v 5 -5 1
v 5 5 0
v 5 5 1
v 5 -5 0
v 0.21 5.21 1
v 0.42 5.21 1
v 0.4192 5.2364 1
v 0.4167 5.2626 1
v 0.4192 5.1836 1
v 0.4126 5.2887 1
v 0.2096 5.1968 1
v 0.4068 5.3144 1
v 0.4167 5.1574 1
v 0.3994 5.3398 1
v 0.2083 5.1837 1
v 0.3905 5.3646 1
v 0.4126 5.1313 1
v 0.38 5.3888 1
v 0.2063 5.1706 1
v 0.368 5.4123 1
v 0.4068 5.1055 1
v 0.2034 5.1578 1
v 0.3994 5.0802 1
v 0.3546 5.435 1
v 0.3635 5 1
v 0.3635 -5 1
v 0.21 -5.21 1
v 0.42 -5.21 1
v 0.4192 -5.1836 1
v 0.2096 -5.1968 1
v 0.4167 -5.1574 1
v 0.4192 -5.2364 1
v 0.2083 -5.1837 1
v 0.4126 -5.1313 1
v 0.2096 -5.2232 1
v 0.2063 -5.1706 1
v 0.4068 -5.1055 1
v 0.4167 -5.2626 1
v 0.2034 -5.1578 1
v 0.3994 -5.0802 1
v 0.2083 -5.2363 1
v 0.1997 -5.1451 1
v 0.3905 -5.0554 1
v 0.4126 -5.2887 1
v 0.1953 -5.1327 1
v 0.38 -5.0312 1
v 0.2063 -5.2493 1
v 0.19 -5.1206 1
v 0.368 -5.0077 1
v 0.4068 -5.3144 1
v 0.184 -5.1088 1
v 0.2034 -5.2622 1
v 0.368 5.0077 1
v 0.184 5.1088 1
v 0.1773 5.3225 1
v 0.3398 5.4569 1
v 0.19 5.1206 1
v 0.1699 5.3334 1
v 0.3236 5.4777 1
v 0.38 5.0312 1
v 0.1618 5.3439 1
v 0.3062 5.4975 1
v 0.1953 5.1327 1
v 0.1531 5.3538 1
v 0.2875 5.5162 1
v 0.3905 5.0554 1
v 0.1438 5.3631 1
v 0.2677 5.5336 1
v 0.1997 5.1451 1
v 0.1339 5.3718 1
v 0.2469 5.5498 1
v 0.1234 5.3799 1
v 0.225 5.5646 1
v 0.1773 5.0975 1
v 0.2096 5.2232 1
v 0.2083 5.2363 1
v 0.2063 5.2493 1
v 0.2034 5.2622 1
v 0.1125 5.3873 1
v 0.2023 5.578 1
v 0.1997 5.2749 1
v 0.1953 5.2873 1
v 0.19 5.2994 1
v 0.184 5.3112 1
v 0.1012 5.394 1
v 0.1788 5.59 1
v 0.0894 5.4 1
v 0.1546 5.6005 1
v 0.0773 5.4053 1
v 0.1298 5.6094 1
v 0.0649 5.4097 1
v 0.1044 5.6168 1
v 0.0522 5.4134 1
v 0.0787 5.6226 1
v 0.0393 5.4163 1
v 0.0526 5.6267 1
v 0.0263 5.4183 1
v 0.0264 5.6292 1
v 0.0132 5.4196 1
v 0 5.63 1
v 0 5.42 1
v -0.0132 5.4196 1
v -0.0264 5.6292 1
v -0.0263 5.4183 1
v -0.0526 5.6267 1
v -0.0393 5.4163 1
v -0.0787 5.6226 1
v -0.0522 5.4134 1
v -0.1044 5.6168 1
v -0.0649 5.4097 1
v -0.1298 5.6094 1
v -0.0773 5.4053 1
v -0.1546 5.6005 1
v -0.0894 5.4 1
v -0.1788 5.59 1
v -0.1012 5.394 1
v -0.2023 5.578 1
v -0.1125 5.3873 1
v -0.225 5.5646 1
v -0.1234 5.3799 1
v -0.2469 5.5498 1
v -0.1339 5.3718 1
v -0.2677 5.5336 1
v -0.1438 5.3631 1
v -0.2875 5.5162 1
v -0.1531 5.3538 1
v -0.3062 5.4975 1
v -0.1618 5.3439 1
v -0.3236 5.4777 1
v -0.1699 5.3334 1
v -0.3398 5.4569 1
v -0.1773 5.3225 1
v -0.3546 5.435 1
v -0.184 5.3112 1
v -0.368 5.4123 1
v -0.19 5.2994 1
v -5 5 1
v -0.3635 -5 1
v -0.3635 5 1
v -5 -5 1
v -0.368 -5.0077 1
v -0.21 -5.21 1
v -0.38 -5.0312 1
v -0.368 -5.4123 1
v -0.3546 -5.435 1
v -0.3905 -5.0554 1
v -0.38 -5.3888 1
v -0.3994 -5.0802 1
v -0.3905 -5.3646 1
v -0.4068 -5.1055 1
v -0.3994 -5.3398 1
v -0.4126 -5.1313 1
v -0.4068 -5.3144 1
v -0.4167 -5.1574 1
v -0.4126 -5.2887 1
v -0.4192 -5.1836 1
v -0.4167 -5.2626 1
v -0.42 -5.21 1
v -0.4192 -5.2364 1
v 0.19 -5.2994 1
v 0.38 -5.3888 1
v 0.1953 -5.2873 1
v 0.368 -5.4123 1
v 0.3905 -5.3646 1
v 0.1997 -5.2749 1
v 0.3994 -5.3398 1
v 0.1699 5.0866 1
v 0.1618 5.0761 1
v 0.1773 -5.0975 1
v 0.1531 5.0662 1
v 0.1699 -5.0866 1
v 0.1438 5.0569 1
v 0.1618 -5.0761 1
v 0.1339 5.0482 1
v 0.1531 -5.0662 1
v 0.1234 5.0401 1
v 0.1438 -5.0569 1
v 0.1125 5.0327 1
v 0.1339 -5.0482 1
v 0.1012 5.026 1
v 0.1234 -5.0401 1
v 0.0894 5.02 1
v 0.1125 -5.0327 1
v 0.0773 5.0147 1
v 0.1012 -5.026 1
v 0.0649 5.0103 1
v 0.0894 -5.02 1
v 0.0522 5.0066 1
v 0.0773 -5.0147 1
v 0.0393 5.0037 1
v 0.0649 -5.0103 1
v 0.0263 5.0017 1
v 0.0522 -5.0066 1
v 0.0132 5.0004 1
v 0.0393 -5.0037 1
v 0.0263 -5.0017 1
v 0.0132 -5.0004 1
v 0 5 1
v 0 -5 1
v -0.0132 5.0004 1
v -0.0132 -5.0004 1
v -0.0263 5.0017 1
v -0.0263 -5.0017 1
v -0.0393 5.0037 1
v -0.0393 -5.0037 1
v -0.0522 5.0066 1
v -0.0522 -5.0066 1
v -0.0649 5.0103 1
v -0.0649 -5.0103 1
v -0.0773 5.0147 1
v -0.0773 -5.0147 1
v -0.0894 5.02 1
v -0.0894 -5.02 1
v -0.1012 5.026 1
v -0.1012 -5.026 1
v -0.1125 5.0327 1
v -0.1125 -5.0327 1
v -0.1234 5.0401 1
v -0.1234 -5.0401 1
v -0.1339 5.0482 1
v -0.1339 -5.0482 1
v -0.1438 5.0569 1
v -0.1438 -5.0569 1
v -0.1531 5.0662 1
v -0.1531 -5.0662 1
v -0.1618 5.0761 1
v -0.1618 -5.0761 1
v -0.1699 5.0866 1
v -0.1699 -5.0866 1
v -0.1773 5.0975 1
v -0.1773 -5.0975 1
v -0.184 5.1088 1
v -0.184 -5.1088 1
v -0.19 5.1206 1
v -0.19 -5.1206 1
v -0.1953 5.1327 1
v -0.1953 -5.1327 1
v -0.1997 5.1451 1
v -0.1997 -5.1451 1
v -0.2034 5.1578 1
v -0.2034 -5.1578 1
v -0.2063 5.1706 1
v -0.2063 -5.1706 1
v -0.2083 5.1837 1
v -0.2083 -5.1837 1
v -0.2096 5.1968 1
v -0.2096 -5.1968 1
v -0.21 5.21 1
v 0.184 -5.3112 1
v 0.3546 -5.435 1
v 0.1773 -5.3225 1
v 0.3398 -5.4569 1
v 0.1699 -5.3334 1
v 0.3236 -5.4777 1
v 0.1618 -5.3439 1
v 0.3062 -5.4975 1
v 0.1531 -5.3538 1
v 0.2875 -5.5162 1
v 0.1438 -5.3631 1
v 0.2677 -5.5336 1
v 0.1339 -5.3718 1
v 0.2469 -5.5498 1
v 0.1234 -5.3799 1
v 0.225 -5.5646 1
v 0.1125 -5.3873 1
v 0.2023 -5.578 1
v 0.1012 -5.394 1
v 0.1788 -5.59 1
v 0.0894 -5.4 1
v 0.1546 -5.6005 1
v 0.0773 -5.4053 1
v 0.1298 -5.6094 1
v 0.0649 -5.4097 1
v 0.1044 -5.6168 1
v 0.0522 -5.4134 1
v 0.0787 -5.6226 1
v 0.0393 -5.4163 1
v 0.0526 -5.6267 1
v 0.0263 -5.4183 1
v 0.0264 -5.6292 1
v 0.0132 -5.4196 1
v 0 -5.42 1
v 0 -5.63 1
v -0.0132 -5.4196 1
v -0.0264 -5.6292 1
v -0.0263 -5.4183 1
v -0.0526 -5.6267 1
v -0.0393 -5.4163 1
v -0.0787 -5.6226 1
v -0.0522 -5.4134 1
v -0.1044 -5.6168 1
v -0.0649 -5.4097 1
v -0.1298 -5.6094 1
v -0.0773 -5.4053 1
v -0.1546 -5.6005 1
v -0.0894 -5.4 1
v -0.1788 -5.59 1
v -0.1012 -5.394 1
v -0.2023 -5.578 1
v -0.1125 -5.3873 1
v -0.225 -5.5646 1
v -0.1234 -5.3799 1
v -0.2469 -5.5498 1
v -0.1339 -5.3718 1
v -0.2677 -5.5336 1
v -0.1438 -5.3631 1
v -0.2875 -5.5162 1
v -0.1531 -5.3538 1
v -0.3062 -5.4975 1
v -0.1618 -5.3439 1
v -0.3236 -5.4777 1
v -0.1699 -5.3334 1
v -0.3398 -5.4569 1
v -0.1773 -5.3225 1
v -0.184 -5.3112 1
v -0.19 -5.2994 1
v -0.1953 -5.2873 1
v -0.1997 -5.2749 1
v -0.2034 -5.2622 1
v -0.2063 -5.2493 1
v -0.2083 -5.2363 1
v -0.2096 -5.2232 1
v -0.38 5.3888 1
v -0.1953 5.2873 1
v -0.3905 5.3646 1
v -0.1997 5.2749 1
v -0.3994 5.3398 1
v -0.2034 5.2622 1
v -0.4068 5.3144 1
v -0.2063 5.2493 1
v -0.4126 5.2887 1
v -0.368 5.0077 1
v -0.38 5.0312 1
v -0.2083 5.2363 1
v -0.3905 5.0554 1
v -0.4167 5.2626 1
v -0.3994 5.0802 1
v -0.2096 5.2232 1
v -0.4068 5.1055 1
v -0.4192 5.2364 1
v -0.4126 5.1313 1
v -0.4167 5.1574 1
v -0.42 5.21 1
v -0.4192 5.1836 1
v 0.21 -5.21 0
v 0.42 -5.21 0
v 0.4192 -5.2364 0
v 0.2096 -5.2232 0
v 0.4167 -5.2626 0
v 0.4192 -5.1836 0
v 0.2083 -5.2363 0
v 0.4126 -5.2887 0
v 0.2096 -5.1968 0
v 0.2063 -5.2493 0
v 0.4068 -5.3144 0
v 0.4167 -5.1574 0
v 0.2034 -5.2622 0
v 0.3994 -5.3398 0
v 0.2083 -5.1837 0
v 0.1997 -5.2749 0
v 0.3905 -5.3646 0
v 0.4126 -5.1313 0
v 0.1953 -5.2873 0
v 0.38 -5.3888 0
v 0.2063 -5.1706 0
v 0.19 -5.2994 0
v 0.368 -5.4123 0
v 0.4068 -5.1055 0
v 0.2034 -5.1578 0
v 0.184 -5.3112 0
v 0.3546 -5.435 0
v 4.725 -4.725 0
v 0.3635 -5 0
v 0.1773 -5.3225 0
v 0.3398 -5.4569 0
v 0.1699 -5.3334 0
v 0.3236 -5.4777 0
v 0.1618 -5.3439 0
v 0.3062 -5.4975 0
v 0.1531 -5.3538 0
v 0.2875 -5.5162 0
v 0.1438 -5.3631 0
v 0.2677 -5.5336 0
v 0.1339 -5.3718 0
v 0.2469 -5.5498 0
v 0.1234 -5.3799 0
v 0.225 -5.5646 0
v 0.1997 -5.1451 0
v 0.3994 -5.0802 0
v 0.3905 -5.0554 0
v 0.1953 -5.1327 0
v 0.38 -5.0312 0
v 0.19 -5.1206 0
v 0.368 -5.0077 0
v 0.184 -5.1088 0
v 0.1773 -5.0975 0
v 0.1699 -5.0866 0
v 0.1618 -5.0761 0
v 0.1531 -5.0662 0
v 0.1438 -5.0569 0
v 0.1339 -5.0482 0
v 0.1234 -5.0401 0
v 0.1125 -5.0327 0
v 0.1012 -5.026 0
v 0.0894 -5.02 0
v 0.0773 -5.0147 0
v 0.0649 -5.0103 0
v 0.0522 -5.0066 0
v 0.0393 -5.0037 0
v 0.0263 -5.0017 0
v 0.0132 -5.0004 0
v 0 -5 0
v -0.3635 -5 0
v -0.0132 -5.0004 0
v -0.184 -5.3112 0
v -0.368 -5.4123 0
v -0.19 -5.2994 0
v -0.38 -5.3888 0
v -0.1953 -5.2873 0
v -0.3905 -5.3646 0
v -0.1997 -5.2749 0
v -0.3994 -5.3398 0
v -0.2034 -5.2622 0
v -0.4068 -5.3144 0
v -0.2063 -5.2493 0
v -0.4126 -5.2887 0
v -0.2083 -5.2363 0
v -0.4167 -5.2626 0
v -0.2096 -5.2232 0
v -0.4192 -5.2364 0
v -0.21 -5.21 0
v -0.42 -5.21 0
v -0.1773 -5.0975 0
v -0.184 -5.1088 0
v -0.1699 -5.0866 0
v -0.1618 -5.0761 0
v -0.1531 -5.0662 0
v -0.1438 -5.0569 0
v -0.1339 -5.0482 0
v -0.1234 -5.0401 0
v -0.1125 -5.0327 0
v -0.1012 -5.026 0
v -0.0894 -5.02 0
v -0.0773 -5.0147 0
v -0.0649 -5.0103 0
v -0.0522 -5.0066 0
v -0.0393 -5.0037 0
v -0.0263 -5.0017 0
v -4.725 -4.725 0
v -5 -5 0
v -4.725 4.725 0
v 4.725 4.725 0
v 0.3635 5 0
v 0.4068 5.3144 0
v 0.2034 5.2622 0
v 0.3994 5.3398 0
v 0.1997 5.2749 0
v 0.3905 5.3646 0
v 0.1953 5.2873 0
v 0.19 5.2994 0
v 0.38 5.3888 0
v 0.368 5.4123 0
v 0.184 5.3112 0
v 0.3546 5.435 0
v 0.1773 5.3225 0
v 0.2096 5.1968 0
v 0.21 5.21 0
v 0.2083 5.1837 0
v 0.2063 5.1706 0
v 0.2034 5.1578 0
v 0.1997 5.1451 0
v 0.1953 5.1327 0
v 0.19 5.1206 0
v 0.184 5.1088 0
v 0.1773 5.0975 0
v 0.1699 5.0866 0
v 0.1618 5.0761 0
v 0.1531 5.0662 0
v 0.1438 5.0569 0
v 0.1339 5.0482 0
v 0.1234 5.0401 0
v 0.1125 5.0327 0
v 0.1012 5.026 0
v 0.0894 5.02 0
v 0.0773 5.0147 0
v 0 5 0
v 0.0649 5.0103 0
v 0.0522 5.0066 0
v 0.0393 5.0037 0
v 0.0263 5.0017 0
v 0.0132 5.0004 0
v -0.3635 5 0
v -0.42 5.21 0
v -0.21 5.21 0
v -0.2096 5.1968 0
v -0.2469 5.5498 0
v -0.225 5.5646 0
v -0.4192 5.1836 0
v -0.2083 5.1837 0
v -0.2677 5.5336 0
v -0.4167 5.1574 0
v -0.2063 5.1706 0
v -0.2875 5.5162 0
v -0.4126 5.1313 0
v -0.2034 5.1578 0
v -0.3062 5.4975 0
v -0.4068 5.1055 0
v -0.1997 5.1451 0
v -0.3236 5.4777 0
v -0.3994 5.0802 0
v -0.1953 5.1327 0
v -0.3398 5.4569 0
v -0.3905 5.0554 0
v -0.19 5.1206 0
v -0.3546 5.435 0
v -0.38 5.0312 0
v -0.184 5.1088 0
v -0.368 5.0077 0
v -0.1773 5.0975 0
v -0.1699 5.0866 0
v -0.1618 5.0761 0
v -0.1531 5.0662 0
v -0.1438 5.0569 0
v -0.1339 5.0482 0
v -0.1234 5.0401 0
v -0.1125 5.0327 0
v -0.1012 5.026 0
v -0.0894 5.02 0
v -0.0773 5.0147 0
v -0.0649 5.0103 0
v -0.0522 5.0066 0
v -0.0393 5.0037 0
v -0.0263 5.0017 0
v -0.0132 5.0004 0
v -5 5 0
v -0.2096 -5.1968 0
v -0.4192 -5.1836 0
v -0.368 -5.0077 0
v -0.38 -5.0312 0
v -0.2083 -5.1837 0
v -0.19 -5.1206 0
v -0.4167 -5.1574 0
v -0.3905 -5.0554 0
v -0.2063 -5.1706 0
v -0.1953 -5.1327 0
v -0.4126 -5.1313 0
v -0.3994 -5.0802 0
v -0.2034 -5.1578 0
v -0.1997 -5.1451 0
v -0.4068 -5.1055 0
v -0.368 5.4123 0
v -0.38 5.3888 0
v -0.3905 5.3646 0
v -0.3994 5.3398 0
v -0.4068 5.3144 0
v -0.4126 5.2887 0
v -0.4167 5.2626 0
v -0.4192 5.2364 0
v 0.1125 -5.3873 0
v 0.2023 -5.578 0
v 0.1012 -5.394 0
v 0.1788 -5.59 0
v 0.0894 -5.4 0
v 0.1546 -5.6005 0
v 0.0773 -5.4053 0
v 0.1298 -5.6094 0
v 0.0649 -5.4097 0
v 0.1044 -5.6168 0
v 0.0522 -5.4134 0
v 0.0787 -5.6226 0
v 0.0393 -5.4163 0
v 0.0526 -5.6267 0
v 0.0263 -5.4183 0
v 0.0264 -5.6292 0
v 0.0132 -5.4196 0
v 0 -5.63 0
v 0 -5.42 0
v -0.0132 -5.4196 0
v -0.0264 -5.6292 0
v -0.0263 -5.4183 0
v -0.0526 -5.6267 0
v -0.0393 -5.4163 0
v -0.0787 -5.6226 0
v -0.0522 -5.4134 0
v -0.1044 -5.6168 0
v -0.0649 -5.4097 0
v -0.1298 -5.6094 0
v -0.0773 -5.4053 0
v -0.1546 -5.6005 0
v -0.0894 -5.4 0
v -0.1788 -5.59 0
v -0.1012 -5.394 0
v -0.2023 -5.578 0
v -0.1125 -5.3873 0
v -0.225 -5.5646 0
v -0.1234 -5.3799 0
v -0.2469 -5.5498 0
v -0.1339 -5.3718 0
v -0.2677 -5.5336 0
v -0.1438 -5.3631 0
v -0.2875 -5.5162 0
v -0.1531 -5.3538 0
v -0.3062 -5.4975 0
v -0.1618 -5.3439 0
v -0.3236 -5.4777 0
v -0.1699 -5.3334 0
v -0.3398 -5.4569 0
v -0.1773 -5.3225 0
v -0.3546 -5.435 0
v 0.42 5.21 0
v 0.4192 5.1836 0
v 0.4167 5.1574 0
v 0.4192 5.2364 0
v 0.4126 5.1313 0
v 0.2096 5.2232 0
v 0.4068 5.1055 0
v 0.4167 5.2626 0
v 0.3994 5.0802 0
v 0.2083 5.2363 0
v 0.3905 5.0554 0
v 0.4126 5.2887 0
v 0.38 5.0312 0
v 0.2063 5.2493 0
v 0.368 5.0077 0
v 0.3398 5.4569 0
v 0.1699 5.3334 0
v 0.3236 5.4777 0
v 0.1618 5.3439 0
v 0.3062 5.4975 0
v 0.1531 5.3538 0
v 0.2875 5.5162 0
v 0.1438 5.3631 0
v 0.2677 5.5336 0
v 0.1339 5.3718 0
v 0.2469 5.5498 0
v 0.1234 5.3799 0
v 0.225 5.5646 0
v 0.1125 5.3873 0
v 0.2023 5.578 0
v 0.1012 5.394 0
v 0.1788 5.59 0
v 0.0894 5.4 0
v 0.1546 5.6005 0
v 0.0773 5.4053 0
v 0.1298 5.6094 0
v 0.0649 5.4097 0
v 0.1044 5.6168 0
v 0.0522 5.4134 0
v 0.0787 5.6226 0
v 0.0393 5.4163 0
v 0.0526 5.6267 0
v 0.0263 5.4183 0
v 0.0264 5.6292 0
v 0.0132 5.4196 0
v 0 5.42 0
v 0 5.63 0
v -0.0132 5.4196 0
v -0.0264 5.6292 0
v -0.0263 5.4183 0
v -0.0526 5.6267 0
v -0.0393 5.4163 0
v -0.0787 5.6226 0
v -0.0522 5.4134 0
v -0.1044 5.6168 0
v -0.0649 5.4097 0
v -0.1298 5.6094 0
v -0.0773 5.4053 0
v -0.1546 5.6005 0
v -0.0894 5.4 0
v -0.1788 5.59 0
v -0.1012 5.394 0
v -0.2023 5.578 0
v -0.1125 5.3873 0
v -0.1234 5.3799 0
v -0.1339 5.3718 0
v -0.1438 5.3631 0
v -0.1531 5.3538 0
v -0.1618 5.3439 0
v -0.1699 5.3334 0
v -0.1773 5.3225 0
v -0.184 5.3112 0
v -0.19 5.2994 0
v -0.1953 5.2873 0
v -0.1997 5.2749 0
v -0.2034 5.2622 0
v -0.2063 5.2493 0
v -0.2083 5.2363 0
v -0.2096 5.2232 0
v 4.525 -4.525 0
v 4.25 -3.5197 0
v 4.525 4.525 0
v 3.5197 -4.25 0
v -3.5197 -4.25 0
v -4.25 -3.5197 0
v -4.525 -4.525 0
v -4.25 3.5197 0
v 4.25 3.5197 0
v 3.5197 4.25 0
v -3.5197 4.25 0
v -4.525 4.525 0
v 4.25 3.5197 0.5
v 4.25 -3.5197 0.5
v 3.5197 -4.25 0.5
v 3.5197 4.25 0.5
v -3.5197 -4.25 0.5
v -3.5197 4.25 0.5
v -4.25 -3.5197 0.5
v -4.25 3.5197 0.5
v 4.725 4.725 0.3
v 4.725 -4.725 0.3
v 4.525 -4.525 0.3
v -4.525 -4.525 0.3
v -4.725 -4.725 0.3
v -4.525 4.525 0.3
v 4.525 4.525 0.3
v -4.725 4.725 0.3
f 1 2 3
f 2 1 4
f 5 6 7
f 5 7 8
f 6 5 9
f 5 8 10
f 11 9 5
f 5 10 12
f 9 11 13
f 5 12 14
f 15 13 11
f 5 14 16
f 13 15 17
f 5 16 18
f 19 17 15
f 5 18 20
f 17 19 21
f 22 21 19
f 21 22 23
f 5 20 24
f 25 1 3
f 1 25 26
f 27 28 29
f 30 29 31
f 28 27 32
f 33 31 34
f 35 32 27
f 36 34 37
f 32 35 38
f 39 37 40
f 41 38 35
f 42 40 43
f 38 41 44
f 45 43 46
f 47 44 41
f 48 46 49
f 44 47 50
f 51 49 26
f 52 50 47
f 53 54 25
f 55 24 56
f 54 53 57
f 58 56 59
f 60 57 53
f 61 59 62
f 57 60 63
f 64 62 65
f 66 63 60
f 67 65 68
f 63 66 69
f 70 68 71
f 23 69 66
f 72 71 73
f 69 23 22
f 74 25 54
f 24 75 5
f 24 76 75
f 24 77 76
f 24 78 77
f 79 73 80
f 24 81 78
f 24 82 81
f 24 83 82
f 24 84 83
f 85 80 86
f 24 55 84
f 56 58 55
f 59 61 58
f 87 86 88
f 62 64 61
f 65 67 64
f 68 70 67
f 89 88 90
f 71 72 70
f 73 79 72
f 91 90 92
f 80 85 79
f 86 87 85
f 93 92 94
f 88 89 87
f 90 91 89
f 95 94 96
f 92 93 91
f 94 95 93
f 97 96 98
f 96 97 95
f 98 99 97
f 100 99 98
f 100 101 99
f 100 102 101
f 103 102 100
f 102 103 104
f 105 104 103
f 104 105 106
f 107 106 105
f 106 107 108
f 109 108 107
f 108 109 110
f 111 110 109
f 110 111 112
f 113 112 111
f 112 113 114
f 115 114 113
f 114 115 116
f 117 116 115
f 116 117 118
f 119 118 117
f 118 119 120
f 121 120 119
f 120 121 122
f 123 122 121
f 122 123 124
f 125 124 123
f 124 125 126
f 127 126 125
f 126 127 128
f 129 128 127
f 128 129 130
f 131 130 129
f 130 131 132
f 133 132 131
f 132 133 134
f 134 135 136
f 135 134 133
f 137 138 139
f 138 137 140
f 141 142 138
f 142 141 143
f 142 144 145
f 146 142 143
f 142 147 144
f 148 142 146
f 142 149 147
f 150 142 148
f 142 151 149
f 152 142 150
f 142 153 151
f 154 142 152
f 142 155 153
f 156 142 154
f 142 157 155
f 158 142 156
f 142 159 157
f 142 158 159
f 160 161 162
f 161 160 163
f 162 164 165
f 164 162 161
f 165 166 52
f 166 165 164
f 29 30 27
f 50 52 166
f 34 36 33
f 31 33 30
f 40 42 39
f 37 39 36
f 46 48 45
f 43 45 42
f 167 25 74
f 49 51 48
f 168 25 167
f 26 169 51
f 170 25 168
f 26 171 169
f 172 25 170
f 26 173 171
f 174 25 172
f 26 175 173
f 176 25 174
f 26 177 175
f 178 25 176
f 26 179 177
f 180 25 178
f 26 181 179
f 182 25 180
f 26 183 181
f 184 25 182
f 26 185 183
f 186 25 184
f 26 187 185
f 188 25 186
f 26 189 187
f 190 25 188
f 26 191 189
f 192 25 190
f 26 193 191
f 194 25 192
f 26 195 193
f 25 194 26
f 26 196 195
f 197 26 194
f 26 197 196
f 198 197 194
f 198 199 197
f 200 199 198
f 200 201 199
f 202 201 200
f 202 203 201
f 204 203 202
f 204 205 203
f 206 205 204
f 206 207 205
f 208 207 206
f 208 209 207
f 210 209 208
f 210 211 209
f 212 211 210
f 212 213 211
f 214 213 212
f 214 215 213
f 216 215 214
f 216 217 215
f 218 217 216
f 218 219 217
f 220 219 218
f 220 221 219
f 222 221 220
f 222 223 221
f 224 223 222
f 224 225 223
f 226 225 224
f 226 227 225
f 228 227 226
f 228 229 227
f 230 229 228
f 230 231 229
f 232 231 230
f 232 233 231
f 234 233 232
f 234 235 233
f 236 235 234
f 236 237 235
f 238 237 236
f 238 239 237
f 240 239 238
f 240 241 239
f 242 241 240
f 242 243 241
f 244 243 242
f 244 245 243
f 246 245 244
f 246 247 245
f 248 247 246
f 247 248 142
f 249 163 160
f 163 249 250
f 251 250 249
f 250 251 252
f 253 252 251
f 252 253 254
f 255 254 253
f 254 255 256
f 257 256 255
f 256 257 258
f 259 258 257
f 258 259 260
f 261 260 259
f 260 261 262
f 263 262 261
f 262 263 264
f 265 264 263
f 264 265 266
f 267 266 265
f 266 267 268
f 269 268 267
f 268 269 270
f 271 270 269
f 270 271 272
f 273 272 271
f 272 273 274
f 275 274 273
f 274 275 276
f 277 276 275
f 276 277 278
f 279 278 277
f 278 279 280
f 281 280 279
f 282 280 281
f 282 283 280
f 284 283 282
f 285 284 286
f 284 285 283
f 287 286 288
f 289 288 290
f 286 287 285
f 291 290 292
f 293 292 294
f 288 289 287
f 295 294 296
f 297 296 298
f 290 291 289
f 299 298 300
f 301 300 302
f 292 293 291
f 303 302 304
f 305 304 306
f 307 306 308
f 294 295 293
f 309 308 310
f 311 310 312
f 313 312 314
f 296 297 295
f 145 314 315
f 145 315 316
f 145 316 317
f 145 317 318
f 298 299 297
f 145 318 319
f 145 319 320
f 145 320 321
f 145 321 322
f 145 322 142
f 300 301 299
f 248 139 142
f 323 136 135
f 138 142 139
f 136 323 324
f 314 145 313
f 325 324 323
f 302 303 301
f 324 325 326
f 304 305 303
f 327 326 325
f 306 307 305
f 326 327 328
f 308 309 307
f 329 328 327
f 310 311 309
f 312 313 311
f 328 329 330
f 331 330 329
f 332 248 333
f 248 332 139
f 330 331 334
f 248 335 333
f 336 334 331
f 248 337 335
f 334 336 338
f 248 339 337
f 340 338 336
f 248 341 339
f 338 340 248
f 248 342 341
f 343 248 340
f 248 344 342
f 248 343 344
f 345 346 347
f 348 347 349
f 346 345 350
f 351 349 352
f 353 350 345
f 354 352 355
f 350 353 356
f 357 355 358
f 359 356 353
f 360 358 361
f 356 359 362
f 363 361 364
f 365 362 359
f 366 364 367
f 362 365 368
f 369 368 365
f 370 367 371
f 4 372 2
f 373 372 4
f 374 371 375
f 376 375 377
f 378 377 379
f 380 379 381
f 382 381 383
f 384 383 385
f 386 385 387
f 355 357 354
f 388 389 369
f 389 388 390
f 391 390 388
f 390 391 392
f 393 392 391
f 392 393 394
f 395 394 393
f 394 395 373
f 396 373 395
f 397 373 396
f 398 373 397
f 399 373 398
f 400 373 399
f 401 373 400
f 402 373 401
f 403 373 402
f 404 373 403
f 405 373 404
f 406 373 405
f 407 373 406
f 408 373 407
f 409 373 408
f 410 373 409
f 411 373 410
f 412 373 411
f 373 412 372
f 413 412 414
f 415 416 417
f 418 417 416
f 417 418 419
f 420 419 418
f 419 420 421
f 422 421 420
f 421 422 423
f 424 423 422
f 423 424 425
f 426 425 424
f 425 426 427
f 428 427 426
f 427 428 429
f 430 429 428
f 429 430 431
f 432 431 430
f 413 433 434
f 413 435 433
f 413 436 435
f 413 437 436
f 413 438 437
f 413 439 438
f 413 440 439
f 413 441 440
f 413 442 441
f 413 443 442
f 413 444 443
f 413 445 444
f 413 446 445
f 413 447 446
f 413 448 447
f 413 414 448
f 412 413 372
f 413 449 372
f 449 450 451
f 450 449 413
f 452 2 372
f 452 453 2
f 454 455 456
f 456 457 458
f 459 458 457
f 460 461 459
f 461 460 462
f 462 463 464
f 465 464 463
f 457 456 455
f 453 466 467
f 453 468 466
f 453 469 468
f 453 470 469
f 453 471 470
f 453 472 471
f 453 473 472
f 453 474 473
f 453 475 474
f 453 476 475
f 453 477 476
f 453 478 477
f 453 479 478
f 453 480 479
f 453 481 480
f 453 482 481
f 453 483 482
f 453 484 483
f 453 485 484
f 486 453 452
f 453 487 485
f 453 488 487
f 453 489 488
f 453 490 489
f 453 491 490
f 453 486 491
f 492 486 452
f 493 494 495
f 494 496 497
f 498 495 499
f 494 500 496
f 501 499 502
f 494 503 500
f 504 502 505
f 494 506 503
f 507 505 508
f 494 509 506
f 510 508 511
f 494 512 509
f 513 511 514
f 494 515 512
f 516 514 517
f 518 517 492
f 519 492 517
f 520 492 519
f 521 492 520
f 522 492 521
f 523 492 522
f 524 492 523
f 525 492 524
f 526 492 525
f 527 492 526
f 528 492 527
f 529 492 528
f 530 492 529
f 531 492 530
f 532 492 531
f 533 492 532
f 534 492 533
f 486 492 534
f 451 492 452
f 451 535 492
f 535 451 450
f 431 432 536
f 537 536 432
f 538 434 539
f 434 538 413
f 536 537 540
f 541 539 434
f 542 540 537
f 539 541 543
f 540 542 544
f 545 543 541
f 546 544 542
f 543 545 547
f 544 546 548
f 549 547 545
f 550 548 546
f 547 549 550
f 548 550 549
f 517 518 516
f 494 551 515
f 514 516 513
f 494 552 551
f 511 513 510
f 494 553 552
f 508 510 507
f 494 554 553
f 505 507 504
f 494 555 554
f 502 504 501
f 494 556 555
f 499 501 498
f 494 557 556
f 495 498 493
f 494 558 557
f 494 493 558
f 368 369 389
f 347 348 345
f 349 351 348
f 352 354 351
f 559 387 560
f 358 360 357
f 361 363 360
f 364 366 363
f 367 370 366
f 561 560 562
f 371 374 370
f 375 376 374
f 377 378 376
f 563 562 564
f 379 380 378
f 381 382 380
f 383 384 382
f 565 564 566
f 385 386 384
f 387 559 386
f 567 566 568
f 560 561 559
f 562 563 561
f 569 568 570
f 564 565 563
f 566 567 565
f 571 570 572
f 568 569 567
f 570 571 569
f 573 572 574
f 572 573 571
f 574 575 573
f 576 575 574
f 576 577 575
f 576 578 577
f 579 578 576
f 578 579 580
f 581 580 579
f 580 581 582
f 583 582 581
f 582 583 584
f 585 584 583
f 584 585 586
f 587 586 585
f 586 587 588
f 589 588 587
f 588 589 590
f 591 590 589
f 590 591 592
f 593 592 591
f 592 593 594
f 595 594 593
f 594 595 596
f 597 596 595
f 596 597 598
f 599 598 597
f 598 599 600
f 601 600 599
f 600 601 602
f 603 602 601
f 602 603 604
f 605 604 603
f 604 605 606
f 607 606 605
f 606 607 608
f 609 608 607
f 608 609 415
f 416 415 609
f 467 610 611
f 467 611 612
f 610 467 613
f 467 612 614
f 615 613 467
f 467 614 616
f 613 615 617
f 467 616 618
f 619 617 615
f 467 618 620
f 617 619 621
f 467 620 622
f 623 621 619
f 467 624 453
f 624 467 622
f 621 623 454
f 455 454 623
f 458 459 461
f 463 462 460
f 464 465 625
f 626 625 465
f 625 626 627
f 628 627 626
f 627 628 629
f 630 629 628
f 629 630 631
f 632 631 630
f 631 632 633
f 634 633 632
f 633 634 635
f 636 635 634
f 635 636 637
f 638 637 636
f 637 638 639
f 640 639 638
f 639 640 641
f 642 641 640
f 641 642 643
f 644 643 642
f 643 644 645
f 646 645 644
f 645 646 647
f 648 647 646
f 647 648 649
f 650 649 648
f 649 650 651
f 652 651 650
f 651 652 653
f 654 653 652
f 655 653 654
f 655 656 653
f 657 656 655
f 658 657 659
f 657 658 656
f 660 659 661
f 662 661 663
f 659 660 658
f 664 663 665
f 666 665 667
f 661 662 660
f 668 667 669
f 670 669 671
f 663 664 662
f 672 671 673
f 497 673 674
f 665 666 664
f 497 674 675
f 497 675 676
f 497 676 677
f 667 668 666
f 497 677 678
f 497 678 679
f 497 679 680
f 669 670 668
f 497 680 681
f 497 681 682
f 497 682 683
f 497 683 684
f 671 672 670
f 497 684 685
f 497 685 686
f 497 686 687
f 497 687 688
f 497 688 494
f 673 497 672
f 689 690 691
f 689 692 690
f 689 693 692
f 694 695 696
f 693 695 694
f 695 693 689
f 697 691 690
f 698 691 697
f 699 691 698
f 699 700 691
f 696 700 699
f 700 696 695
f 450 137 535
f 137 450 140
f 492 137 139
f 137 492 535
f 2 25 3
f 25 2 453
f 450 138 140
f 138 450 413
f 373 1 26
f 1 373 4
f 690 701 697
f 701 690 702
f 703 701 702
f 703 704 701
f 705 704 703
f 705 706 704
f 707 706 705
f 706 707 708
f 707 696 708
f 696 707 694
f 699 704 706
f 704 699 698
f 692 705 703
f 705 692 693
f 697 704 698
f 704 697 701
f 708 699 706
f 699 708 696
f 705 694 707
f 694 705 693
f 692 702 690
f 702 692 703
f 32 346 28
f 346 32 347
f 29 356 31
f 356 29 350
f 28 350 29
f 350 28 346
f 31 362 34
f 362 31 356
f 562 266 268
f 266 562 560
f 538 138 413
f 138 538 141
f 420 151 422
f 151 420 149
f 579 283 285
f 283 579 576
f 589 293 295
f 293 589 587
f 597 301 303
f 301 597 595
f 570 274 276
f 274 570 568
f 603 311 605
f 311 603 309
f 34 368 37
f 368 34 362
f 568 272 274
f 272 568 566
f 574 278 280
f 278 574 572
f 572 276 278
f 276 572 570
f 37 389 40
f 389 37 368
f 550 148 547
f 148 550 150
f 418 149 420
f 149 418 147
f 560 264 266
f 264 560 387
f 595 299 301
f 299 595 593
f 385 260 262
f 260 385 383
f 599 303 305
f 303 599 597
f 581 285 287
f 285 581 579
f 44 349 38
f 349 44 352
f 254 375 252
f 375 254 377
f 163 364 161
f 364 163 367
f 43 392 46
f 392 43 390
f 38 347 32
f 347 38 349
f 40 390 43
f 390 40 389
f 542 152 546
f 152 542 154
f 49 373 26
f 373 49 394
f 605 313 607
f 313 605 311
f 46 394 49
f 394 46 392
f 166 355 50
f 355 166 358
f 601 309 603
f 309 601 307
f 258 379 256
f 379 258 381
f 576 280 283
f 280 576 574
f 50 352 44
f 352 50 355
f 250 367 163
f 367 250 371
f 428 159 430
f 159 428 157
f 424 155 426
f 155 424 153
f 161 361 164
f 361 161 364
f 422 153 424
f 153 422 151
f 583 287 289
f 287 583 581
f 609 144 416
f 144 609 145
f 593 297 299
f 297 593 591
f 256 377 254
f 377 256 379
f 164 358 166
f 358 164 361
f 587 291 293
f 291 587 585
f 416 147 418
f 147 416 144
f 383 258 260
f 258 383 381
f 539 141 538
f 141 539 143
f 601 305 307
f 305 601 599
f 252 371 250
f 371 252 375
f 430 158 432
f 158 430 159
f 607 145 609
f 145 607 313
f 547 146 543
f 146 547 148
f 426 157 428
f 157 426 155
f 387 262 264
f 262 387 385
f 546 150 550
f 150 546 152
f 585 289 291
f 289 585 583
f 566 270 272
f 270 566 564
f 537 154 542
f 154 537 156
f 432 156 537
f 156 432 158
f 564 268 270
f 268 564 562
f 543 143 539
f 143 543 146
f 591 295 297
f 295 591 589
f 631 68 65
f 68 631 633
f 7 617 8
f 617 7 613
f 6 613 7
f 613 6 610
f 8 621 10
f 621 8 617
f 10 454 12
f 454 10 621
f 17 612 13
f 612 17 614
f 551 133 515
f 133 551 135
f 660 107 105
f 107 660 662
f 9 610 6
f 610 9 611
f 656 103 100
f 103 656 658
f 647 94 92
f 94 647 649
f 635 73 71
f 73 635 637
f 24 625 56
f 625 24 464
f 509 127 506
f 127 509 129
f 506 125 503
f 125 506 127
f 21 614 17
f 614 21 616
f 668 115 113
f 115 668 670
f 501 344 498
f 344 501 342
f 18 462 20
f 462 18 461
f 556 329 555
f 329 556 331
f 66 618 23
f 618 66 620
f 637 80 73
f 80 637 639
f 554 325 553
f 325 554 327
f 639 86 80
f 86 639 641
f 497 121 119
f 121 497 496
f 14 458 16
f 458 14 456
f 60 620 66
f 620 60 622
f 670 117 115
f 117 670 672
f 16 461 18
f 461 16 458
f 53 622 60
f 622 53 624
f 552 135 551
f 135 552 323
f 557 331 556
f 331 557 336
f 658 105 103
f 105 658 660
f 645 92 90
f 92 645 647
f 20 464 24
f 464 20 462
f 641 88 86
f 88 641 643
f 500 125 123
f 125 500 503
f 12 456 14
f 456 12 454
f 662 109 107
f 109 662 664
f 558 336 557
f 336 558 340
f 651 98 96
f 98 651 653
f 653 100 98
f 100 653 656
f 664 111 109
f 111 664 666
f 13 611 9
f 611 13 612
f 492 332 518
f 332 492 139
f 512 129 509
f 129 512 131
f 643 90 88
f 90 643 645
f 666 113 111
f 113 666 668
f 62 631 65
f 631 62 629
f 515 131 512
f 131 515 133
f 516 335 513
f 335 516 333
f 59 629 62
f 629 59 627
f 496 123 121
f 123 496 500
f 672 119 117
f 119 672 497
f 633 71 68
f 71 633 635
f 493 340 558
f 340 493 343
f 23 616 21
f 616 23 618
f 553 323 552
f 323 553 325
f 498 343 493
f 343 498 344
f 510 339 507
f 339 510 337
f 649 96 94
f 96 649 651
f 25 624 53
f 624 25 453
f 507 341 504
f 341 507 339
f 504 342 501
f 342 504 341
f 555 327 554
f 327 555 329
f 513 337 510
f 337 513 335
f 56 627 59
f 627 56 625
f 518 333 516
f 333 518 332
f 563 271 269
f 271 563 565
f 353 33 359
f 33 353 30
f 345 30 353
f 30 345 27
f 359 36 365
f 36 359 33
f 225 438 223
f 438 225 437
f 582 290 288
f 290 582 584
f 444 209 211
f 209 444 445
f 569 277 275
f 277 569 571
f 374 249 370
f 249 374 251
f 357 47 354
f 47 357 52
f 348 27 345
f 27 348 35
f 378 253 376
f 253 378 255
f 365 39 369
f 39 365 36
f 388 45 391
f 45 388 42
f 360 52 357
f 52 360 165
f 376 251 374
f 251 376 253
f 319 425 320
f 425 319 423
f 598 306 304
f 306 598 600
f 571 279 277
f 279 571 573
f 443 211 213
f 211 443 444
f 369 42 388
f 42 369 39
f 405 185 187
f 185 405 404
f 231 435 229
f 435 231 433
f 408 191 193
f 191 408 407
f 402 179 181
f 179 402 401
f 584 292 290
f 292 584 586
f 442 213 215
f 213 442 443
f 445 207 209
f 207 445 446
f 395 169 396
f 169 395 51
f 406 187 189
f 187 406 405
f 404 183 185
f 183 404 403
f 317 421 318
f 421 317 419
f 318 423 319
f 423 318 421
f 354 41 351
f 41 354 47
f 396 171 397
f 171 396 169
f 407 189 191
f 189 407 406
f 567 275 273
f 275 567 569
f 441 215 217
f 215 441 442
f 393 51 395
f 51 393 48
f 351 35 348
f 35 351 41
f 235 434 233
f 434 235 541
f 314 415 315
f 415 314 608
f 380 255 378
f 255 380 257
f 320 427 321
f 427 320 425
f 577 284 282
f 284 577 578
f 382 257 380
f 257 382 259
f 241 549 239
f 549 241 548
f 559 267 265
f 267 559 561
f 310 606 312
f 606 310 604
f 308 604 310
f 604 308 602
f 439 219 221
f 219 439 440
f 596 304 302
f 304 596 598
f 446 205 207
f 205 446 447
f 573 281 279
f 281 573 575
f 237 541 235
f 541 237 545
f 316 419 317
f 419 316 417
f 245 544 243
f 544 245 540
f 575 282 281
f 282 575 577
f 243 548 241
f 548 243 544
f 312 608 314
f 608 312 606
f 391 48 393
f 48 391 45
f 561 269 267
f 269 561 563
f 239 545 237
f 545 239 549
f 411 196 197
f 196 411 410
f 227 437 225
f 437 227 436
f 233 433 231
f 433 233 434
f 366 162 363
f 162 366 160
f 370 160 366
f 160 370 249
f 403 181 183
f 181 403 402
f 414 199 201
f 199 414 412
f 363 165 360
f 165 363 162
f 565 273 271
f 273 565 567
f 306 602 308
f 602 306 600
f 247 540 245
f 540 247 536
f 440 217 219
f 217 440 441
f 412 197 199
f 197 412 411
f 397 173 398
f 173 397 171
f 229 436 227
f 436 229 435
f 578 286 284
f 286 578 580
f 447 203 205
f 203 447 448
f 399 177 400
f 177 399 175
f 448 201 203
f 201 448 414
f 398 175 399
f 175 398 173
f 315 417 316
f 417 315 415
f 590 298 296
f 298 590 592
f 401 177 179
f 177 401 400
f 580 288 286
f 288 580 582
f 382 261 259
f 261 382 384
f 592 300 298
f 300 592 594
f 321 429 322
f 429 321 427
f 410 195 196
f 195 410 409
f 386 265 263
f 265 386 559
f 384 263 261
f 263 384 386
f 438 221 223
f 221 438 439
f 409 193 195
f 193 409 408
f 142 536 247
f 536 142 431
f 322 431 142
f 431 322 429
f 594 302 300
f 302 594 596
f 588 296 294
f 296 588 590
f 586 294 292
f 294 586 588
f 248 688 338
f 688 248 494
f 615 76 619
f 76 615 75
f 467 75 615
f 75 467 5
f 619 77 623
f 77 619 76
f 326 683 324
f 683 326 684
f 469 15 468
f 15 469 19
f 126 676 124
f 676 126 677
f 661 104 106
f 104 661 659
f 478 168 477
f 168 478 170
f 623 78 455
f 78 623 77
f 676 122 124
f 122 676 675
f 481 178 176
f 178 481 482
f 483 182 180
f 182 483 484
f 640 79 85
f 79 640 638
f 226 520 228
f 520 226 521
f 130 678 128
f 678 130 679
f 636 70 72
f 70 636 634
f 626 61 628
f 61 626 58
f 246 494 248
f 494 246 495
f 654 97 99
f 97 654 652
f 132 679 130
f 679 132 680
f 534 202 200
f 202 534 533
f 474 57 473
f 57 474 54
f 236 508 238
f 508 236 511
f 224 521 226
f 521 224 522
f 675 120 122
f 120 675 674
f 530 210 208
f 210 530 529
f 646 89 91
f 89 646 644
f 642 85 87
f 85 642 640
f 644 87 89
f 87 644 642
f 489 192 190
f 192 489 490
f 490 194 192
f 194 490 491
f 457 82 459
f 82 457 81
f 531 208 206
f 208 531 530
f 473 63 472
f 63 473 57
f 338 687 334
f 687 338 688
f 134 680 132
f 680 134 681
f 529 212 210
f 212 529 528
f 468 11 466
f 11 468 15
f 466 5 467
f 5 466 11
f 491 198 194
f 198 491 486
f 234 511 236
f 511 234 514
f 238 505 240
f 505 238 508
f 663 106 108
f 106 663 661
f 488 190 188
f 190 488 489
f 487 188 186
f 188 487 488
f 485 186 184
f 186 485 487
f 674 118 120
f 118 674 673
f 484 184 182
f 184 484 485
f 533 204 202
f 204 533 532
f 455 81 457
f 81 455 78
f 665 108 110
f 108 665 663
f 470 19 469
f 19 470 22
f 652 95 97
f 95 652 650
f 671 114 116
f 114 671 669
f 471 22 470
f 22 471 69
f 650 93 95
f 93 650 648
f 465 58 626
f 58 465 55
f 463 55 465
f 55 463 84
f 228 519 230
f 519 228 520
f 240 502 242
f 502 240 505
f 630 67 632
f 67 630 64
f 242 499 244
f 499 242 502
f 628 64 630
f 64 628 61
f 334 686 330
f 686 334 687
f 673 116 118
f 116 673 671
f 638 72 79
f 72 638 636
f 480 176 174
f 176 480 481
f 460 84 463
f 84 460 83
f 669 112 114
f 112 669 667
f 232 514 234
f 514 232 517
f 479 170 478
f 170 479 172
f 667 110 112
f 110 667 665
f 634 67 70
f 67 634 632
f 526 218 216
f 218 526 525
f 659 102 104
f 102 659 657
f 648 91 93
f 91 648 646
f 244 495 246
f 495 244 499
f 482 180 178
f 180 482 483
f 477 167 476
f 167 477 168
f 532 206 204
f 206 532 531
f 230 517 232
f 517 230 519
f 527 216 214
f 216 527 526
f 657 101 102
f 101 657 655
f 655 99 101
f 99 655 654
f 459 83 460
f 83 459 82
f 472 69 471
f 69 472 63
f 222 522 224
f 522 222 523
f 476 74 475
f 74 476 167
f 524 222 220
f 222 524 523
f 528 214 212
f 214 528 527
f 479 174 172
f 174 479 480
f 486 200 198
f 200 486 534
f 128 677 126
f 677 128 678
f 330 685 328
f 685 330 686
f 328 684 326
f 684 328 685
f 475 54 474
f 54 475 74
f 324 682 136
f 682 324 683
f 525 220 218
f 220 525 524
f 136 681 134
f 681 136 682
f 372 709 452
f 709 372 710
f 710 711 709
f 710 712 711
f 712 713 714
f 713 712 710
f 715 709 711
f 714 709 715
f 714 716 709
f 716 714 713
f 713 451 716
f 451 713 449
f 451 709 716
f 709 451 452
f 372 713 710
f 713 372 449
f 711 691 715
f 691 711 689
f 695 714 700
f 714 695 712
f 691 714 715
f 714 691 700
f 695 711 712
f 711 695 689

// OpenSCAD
// file: modules.scad
include <params.scad>;

module base_quadrant(edge_length, wall_thickness, height, shift)
{      
    difference()
    {
        translate([-edge_length/2,-edge_length/2,0])cube([edge_length,edge_length,height]);
        translate([-inner_length/2,-inner_length/2,shift])cube([inner_length,inner_length,height]);
    };  
    fill_corners(edge_length,wall_thickness,height);
}


module tongue(tongue_width, tongue_height, edge_length, wall_thickness)
{
    tongue_outer_width = edge_length - wall_thickness + tongue_width;
    tongue_inner_width = tongue_outer_width - tongue_width*2;
  
    difference()
    {
        translate([-tongue_outer_width/2,-tongue_outer_width/2, height])cube([tongue_outer_width,tongue_outer_width,tongue_height]);
        translate([-tongue_inner_width/2,-tongue_inner_width/2,height])cube([tongue_inner_width,tongue_inner_width,tongue_height]);

    };  
    
    
}


module groove(tongue_width, tongue_height, edge_length, wall_thickness) 
{
    tongue_outer_width = edge_length - wall_thickness + tongue_width;
    tongue_inner_width = tongue_outer_width - tongue_width*2;
    difference()
    {
        translate([-tongue_outer_width/2,-tongue_outer_width/2, 0])cube([tongue_outer_width,tongue_outer_width,tongue_height+0.1]);
        translate([-tongue_inner_width/2,-tongue_inner_width/2, 0])cube([tongue_inner_width,tongue_inner_width,tongue_height+0.1]);

    };
    
}

module intermodule_screw(edge_length,height,screw_radius)
{
    for (a=[-1,1])
            translate([0,a*(edge_length+2*screw_radius)/2, 0])cylinder(height,screw_radius*2,screw_radius*2);

    
}
module intermodule_screw_hole(edge_length,height,screw_radius)
{
    for (a=[-1,1])
            translate([0,a*(edge_length+2*screw_radius)/2, 0])cylinder(height, screw_radius, screw_radius);
}

module intermodule_nut_hole(edge_length,height,screw_radius,nut_width, nut_height, fn)
{
    for (a=[-1,1])
            translate([0,a*(edge_length+2*screw_radius)/2, 0])cylinder(nut_height, nut_width, nut_width, $fn=fn);
}




module module_screw(edge_length, height, screw_radius, head_width)
{

    for (a = [[-1,-1], [1,1], [1,-1], [-1,1]])
    {
        x = a[0]*(edge_length+head_width)/2;
        y = a[1]*(edge_length+head_width)/2;
        translate([x,y, 0])cylinder(height,head_width*1.5,head_width*1.5);
    }    
}

module module_screw_hole(edge_length, height, screw_radius, head_height, head_width, offset, fn)
{

    for (a = [[-1,-1], [1,1], [1,-1], [-1,1]])
    {
        x = a[0]*(edge_length+head_width)/2;
        y = a[1]*(edge_length+head_width)/2;

        translate([x,y, 0])cylinder(height, screw_radius, screw_radius);
        translate([x,y, offset])cylinder(head_height, head_width, head_width, $fn=fn);
        
    }    
}

module fill_corners(edge_length,wall_thickness,height)
{
    ar = edge_length/2-wall_thickness-0.1;
    for (rot=[45,135,225,315])
        rotate([0,0,rot])translate([sqrt(ar*ar + ar*ar),0,height/2])cube([wall_thickness,2*wall_thickness,height],center=true);
    
}
// file: params.scad
$fn = 100;

edge_length = 10;
height = 1;
wall_thickness = 0.75;

tongue_width = 0.2;
tongue_height = 0.2;

screw_radius = 0.21; //M4
head_width = 0.405;
head_height = 0.7;
nut_width = 0.4;
nut_height = 0.5;

bottom_screw_distance = 5;


inner_length = edge_length-2*wall_thickness;

tongue_outer_width = edge_length - wall_thickness + tongue_width;
tongue_inner_width = tongue_outer_width - tongue_width*2;
// main file
include <params.scad>;
include <modules.scad>;
height = 1;

difference()
{
    union(){
        base_quadrant(edge_length, wall_thickness, height, -0.5);
        intermodule_screw(edge_length,height,screw_radius);
    }
    intermodule_screw_hole(edge_length,height,screw_radius);
    groove(tongue_width, tongue_height, edge_length, wall_thickness);
}
